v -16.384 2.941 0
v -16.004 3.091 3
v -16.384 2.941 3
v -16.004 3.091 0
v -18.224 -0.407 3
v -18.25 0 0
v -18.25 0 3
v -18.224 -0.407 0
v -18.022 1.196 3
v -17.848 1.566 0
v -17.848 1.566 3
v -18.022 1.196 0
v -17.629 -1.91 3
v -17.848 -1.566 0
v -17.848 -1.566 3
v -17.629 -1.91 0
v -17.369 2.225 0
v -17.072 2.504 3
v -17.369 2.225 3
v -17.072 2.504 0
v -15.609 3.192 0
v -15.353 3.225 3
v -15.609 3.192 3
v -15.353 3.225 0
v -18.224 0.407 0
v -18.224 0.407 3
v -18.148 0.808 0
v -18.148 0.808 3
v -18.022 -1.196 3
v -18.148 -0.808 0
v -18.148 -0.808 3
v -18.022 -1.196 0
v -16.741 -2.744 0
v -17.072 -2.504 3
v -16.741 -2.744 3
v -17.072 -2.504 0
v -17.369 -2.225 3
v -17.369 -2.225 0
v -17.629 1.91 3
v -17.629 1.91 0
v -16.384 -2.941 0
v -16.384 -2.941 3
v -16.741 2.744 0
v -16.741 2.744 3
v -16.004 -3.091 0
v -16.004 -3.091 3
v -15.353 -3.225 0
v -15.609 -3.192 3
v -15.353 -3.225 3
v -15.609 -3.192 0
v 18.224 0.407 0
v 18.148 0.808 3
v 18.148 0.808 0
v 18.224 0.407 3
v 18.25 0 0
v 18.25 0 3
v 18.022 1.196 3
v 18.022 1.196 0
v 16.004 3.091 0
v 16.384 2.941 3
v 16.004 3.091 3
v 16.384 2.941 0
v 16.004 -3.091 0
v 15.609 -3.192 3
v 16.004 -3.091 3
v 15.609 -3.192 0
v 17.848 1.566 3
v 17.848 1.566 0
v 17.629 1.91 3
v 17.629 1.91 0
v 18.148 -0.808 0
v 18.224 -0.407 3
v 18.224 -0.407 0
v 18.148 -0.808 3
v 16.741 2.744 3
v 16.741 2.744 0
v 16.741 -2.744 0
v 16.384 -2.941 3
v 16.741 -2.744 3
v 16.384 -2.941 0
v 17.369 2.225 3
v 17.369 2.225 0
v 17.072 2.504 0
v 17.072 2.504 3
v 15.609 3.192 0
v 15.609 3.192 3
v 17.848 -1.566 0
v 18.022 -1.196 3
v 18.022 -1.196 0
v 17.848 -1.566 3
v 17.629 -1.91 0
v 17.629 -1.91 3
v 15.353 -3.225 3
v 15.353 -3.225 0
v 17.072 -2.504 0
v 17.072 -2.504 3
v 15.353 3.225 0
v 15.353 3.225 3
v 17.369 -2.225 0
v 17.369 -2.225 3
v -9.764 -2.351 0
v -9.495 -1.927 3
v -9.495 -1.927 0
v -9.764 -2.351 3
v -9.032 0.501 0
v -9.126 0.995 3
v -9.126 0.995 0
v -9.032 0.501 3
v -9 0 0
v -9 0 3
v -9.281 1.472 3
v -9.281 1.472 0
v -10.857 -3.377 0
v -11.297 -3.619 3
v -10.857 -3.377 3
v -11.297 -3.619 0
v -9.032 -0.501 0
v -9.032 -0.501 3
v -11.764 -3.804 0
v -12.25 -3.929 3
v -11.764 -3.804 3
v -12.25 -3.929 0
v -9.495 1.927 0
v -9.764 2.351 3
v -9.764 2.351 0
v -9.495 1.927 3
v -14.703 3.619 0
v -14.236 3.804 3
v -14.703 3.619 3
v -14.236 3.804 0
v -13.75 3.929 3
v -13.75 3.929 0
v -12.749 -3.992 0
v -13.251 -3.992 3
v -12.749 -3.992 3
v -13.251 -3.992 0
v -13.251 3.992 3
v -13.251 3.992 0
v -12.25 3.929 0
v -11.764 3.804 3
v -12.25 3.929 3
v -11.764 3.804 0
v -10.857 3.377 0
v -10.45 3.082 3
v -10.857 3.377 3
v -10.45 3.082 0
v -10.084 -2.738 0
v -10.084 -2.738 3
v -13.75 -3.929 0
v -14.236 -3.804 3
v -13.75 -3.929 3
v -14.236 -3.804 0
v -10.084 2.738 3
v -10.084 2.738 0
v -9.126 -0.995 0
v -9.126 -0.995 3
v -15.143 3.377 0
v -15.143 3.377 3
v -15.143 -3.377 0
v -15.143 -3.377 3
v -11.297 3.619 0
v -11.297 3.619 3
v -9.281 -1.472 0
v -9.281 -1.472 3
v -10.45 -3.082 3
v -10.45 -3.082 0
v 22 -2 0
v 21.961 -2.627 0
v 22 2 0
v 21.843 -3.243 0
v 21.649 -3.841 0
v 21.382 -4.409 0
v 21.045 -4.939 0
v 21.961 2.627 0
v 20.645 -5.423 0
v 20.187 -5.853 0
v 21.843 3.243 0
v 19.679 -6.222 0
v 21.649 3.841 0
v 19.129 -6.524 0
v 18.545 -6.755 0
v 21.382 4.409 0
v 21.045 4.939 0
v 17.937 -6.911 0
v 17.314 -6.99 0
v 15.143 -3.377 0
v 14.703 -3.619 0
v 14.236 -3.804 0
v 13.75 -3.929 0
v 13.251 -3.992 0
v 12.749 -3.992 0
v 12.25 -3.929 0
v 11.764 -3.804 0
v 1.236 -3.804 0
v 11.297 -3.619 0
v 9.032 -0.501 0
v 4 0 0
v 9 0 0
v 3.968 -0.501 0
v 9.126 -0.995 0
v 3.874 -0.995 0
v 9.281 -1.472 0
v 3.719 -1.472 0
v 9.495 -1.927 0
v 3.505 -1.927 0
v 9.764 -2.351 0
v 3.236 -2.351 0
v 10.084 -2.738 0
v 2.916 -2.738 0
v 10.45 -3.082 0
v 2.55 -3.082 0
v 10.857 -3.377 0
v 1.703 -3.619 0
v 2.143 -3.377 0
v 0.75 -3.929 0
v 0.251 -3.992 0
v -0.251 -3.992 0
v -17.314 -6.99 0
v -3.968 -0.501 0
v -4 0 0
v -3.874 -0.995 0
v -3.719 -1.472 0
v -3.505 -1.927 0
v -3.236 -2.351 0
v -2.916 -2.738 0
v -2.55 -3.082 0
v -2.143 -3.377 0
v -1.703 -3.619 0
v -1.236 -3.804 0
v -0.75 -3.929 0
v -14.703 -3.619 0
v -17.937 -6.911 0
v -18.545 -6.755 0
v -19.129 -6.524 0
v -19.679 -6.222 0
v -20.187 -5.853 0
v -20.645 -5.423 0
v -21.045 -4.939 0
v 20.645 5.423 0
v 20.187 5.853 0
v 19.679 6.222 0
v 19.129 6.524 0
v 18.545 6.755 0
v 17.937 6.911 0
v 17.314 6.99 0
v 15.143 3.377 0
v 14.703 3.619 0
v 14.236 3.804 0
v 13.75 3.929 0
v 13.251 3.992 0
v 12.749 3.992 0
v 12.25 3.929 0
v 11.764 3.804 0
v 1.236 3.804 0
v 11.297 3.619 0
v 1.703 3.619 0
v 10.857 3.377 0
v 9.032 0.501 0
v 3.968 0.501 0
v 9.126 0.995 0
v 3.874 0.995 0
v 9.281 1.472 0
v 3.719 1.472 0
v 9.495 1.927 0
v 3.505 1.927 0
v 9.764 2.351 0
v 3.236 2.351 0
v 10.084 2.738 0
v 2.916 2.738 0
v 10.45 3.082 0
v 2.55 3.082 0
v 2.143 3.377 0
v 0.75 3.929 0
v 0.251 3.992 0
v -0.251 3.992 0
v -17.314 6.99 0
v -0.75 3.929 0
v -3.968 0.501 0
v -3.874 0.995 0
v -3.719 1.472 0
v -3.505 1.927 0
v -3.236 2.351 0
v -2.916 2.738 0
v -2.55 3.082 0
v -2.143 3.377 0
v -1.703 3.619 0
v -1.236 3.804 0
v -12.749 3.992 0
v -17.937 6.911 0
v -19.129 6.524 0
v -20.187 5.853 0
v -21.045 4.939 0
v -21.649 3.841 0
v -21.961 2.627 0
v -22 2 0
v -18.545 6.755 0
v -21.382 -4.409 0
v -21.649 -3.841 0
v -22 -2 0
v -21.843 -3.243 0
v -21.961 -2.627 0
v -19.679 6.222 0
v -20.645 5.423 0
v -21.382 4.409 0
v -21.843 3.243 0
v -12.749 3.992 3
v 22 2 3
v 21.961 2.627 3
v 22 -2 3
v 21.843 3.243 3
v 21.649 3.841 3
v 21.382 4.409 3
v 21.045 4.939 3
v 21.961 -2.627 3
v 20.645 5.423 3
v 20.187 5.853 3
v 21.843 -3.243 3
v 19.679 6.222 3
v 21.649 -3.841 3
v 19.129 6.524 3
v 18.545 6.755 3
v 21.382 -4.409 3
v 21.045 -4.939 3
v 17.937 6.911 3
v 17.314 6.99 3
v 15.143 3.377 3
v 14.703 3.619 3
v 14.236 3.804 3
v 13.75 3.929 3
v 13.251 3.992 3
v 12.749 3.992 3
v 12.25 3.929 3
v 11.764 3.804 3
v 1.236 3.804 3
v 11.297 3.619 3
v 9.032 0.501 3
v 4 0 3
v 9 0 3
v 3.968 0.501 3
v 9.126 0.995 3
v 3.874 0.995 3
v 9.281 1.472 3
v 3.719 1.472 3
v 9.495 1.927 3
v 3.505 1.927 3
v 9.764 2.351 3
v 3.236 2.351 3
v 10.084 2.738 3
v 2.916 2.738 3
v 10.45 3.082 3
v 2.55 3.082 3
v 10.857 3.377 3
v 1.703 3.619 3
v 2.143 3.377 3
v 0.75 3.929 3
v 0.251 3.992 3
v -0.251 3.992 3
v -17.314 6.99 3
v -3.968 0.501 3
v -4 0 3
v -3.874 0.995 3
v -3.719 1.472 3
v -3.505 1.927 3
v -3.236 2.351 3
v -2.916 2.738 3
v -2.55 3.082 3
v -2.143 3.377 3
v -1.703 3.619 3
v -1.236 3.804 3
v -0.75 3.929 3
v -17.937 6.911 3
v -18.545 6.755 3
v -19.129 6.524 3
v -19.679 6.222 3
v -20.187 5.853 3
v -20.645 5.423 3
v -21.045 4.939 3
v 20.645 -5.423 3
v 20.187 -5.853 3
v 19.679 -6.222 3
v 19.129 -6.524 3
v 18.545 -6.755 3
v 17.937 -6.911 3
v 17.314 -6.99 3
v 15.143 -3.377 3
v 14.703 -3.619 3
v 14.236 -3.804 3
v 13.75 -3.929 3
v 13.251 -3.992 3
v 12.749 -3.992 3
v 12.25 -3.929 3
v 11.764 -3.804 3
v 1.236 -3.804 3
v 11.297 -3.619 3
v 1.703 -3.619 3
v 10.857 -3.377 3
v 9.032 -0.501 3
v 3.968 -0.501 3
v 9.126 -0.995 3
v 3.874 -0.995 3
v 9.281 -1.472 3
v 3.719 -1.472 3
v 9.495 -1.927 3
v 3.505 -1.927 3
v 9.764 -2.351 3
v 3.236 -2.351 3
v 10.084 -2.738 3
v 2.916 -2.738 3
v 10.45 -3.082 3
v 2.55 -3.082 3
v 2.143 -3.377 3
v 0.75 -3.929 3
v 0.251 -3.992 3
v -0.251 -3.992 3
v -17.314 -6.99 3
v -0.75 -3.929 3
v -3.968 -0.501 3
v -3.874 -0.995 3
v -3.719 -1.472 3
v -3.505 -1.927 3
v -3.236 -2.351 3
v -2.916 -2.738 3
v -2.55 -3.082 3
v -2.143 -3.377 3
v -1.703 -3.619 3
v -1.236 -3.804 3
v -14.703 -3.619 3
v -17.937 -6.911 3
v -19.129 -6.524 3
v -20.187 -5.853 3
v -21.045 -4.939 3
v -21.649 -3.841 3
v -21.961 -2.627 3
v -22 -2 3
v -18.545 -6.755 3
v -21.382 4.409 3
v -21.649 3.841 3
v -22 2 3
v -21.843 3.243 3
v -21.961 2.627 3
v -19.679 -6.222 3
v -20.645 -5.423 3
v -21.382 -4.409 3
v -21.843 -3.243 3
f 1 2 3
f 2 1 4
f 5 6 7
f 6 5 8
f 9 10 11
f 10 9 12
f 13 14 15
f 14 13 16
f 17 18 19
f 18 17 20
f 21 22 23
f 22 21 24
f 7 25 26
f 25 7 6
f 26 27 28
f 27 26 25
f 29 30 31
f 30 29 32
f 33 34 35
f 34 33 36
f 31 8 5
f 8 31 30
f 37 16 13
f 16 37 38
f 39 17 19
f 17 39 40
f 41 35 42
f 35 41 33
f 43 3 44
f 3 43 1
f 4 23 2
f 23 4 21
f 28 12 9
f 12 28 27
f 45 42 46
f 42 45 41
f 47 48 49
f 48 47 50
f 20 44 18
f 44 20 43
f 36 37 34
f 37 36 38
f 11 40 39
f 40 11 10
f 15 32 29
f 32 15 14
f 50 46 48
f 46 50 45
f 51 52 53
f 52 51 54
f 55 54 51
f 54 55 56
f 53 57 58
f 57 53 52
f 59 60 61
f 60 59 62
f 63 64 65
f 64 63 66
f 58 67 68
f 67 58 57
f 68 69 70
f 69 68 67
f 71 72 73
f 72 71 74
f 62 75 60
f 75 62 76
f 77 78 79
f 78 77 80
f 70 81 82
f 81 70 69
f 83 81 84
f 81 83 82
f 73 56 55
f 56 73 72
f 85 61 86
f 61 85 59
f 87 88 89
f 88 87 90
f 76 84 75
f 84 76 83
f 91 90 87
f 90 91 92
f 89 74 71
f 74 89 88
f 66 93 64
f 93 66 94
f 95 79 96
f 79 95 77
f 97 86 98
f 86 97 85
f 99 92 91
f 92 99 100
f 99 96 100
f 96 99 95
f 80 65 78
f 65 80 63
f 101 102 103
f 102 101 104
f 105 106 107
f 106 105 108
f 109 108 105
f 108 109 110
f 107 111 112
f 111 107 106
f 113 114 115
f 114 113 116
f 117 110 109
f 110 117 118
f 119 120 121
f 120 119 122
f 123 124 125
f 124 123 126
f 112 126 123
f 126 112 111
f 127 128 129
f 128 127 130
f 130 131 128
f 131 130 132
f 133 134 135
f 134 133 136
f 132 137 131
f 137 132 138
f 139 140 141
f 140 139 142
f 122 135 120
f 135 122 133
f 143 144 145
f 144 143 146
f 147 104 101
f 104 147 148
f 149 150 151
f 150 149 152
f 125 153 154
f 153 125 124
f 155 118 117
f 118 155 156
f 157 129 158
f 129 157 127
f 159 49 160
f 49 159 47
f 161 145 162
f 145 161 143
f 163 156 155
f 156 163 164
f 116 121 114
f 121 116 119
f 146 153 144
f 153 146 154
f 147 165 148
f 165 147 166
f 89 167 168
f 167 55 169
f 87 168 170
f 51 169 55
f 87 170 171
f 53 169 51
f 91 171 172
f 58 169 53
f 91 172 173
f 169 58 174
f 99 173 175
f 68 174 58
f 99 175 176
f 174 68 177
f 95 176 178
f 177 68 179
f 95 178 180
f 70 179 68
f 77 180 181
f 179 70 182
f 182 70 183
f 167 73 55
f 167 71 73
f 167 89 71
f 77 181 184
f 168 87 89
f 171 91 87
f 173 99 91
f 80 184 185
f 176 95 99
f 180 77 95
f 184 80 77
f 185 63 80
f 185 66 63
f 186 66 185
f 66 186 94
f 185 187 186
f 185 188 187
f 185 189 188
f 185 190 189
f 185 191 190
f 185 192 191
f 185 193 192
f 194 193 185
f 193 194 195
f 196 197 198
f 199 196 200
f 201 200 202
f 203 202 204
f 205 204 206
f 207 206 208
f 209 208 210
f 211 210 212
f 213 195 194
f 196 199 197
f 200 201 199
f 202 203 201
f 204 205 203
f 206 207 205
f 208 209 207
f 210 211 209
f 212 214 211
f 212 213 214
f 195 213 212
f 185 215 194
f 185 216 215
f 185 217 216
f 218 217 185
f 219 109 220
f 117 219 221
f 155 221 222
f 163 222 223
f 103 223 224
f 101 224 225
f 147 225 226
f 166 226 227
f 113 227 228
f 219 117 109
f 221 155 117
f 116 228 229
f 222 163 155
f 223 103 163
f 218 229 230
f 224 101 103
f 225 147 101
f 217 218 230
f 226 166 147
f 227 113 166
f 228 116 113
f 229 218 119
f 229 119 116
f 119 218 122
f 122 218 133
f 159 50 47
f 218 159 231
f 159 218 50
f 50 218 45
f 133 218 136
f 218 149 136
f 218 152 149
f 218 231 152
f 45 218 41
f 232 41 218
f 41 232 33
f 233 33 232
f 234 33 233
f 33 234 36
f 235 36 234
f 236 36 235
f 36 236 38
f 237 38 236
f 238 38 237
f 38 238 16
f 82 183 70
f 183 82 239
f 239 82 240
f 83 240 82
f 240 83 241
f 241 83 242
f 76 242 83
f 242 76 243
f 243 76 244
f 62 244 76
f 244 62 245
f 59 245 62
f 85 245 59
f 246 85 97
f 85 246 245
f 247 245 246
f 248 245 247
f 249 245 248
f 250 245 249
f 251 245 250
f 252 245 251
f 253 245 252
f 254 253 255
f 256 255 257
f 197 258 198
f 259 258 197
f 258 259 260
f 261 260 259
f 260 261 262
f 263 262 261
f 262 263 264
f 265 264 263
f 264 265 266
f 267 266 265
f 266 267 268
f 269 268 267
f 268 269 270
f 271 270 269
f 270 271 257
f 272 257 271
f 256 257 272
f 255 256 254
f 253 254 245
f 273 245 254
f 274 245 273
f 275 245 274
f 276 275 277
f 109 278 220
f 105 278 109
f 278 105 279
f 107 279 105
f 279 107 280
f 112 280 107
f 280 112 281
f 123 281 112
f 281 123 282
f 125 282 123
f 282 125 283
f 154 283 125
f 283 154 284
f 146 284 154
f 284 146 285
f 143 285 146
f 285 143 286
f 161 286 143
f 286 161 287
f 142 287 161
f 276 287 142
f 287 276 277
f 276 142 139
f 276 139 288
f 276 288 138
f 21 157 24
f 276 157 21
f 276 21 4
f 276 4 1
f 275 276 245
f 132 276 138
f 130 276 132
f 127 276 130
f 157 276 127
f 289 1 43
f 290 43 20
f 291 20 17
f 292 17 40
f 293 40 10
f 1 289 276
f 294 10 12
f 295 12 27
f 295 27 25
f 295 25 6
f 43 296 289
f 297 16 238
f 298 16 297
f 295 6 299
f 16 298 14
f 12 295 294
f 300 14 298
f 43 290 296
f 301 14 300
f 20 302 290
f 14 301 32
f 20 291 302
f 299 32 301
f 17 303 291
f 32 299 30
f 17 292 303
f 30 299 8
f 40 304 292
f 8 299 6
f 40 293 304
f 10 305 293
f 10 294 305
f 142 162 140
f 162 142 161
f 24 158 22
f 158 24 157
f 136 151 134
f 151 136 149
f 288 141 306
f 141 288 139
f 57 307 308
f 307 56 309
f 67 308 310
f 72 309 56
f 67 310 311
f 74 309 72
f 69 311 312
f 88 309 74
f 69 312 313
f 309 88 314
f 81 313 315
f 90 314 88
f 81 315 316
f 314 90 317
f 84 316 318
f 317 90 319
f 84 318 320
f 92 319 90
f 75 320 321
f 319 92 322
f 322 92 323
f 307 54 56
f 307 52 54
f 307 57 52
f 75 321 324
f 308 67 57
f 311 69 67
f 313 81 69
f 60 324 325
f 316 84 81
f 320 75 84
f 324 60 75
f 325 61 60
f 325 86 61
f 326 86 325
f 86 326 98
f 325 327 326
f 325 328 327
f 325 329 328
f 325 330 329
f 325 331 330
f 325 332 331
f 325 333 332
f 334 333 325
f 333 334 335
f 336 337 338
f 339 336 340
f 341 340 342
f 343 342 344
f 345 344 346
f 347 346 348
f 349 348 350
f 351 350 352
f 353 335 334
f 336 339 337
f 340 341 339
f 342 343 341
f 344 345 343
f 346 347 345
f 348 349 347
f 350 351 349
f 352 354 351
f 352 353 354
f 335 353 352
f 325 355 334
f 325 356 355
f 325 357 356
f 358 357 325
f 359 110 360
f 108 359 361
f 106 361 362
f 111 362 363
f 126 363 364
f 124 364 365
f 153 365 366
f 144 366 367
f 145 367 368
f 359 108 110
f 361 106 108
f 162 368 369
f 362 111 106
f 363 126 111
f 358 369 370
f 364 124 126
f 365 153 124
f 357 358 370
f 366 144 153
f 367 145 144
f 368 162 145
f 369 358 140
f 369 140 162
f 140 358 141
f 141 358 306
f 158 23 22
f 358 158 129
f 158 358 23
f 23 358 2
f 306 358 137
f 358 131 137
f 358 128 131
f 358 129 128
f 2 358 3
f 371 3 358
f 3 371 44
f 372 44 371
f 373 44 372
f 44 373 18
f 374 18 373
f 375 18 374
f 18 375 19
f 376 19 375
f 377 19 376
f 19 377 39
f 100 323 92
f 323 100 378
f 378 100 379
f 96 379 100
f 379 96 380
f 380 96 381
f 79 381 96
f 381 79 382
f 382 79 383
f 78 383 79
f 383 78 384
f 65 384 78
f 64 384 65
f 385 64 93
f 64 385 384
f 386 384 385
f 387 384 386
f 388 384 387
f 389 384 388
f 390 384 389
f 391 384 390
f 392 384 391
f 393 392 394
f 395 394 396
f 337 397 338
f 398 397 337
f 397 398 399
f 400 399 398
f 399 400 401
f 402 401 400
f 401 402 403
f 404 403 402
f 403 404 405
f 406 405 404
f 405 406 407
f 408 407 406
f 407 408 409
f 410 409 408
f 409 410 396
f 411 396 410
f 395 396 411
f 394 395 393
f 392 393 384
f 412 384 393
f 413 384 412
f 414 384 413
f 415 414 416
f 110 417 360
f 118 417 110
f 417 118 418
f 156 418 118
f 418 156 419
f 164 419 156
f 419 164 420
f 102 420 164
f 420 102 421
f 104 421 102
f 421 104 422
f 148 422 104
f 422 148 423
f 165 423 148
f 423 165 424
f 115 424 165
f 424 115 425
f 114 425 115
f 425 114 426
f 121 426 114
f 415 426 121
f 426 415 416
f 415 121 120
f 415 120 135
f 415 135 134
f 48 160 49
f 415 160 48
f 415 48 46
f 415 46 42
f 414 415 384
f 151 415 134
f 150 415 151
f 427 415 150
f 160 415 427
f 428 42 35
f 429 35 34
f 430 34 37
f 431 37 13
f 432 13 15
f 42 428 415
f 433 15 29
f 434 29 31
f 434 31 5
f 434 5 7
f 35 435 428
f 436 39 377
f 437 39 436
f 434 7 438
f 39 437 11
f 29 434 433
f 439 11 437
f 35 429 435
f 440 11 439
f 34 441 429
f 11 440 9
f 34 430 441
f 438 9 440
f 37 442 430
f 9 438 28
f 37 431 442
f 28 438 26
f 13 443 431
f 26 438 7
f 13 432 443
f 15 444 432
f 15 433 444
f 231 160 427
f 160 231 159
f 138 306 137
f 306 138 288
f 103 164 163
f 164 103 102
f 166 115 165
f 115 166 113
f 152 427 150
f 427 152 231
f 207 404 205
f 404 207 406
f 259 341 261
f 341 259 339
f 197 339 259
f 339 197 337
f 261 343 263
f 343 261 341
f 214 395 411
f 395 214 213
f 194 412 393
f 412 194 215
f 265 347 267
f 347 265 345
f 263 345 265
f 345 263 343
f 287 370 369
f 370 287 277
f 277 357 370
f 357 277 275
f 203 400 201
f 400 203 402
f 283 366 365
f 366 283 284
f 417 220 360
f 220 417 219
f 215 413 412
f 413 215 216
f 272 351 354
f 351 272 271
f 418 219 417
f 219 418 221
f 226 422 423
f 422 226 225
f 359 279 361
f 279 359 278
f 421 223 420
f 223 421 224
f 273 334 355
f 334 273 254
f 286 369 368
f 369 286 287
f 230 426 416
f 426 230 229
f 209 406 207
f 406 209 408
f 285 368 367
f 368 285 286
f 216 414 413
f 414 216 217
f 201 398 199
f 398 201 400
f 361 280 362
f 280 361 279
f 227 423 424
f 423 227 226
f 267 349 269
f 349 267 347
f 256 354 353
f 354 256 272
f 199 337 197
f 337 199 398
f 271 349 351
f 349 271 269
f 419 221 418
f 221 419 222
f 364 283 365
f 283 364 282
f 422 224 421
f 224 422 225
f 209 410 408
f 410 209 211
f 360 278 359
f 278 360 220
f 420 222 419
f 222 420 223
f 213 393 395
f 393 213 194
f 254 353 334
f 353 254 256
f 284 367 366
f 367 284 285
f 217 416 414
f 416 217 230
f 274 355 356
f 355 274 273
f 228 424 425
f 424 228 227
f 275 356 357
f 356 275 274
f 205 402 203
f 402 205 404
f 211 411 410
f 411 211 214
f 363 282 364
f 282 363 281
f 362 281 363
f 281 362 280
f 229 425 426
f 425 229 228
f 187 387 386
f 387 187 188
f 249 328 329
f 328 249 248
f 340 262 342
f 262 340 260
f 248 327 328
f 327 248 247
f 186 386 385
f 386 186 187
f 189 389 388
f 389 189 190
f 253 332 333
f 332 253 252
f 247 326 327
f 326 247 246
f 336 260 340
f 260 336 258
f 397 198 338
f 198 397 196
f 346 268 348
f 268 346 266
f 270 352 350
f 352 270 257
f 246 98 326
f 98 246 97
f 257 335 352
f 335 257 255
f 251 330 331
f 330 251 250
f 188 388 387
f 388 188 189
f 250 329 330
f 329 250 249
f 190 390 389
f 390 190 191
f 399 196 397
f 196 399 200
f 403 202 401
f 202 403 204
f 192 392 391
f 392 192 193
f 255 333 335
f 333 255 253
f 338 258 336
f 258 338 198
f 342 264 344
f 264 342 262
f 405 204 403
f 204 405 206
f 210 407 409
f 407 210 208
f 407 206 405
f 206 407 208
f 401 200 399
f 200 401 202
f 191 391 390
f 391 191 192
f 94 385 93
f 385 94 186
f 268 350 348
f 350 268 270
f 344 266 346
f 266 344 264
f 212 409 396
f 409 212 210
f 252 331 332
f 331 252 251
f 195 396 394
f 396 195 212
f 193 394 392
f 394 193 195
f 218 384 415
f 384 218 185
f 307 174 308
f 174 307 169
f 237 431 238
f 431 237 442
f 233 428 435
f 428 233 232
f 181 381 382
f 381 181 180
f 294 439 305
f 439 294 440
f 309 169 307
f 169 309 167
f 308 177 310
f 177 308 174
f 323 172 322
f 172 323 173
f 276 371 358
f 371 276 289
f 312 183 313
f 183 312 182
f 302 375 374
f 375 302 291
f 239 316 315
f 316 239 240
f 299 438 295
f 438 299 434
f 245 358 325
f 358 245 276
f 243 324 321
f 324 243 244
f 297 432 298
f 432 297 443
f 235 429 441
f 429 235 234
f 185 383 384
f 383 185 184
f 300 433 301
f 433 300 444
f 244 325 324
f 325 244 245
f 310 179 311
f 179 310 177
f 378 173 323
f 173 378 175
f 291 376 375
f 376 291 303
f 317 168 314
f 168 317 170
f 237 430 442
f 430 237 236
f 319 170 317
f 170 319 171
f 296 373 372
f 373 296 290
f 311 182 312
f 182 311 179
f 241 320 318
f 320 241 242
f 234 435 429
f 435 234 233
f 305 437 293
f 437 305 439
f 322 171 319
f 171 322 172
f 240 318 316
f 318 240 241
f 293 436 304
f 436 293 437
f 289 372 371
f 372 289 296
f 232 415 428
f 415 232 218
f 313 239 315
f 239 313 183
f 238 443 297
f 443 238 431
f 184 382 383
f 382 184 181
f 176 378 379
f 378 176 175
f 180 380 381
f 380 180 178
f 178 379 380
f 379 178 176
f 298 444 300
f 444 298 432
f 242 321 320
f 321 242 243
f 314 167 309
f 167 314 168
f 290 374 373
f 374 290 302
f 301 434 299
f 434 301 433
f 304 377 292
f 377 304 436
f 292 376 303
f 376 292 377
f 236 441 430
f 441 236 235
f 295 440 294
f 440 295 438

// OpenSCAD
$fn = 50;

difference() {
	union() {
		hull() {
			translate(v = [-17.0, 2.0, 0]) {
				cylinder(h = 3, r = 5);
			}
			translate(v = [17.0, 2.0, 0]) {
				cylinder(h = 3, r = 5);
			}
			translate(v = [-17.0, -2.0, 0]) {
				cylinder(h = 3, r = 5);
			}
			translate(v = [17.0, -2.0, 0]) {
				cylinder(h = 3, r = 5);
			}
		}
	}
	union() {
		translate(v = [-15.0, 0.0, -100.0]) {
			cylinder(h = 200, r = 3.25);
		}
		translate(v = [15.0, 0.0, -100.0]) {
			cylinder(h = 200, r = 3.25);
		}
		translate(v = [-15.0, 0.0, -100.0]) {
			cylinder(h = 200, r = 1.8);
		}
		translate(v = [15.0, 0.0, -100.0]) {
			cylinder(h = 200, r = 1.8);
		}
		translate(v = [-13.0, 0, 0.0]) {
			cylinder(h = 3, r = 4.0);
		}
		cylinder(h = 3, r = 4.0);
		translate(v = [13.0, 0, 0.0]) {
			cylinder(h = 3, r = 4.0);
		}
	}
}
